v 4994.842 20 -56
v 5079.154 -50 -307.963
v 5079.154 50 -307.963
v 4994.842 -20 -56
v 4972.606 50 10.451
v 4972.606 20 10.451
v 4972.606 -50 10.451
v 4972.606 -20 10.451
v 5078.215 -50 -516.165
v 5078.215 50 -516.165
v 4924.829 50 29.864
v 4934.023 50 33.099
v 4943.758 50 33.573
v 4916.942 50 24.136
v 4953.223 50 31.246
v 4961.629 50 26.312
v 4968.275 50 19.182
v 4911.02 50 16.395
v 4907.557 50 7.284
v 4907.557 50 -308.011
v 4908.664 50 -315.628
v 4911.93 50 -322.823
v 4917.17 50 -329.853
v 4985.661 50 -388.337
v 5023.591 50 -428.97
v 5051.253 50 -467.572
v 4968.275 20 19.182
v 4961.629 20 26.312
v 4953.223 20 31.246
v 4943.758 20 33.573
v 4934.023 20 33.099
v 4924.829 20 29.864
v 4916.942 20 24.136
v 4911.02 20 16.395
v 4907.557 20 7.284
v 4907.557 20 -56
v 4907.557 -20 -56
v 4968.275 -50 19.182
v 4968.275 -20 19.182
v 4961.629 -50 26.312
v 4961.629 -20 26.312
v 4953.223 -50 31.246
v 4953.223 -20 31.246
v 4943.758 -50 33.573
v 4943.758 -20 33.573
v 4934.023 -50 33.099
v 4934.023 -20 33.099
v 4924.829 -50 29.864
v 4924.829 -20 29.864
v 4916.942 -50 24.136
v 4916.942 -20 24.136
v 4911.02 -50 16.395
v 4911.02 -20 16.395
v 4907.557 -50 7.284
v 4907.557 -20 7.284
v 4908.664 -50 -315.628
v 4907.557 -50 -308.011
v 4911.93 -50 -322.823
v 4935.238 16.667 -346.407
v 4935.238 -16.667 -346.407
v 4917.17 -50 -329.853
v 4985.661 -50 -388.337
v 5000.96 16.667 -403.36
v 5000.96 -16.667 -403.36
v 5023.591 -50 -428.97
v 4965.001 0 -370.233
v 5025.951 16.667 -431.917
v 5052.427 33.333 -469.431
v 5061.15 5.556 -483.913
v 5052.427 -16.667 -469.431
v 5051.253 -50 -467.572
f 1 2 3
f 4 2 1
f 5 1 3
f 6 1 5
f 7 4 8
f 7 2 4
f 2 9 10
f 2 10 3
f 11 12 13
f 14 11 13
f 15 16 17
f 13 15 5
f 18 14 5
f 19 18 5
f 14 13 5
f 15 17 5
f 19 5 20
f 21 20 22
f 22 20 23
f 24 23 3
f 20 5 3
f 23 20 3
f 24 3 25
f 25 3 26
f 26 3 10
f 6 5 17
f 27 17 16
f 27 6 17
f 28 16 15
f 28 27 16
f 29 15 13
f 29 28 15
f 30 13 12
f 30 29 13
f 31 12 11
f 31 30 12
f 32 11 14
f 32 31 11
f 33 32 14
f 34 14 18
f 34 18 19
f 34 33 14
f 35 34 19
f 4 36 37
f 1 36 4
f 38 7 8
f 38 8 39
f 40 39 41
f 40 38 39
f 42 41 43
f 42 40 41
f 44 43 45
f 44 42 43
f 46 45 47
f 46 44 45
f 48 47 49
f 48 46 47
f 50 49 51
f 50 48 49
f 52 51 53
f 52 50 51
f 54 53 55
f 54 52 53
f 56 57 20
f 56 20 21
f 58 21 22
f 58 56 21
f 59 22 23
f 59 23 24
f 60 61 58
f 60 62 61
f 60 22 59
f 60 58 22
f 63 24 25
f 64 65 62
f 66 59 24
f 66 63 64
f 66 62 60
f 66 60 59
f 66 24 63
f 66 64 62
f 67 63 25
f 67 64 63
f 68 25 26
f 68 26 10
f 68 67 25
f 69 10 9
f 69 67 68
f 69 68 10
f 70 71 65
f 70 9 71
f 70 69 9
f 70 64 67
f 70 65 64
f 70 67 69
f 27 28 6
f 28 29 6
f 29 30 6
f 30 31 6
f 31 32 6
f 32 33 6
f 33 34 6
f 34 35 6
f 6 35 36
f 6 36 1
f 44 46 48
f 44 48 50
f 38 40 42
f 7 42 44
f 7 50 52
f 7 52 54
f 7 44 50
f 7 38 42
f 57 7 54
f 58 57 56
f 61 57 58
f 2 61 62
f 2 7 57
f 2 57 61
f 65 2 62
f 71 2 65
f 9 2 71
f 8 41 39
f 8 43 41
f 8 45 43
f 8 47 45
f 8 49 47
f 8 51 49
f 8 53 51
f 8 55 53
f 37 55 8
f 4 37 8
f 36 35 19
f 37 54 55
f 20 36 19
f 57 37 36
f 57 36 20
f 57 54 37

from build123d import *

# Parameters (mm, degrees)
BOX_W     = 100
BOX_H     = 40
BOX_DEPTH = 100


with BuildPart() as cube:
    # Box → Box (new body)
    with BuildSketch(Plane(origin=(4896, -20, -56), x_dir=(1, 0, 0), z_dir=(0, 0, 1))):
        with Locations((50, 20)):
            Rectangle(BOX_W, BOX_H)
    extrude(amount=BOX_DEPTH)


with BuildPart() as cut:
    # Sweep: sweep along a path in Sketch001
    with BuildLine(Plane.YZ) as sweep_path:
        Line((50, -102.428871), (-50, -102.428871))
    # Sketch → Sweep (sweep)
    with BuildSketch(Plane.XZ):
        with BuildLine():
            Line((5079.153809, -307.963104), (4972.606463, 10.450841))
            ThreePointArc((4972.606463, 10.450841), (4938.873384, 33.689038), (4907.556965, 7.284185))
            Line((4907.556965, 7.284185), (4907.556965, -308.010559))
            add(Edge.make_bspline(
                [(4907.556965, -308.010559), (4907.383301, -349.562683), (5004.027832, -362.999908), (5078.214844, -516.165161)],
                knots=[0, 0, 0, 0, 1, 1, 1, 1], degree=3))
            Line((5078.214844, -516.165161), (5079.153809, -307.963104))
        make_face()
    sweep(path=sweep_path.line)

    # Cut: cut Cube
    add(cube.part, mode=Mode.SUBTRACT)


solid = cut.part
